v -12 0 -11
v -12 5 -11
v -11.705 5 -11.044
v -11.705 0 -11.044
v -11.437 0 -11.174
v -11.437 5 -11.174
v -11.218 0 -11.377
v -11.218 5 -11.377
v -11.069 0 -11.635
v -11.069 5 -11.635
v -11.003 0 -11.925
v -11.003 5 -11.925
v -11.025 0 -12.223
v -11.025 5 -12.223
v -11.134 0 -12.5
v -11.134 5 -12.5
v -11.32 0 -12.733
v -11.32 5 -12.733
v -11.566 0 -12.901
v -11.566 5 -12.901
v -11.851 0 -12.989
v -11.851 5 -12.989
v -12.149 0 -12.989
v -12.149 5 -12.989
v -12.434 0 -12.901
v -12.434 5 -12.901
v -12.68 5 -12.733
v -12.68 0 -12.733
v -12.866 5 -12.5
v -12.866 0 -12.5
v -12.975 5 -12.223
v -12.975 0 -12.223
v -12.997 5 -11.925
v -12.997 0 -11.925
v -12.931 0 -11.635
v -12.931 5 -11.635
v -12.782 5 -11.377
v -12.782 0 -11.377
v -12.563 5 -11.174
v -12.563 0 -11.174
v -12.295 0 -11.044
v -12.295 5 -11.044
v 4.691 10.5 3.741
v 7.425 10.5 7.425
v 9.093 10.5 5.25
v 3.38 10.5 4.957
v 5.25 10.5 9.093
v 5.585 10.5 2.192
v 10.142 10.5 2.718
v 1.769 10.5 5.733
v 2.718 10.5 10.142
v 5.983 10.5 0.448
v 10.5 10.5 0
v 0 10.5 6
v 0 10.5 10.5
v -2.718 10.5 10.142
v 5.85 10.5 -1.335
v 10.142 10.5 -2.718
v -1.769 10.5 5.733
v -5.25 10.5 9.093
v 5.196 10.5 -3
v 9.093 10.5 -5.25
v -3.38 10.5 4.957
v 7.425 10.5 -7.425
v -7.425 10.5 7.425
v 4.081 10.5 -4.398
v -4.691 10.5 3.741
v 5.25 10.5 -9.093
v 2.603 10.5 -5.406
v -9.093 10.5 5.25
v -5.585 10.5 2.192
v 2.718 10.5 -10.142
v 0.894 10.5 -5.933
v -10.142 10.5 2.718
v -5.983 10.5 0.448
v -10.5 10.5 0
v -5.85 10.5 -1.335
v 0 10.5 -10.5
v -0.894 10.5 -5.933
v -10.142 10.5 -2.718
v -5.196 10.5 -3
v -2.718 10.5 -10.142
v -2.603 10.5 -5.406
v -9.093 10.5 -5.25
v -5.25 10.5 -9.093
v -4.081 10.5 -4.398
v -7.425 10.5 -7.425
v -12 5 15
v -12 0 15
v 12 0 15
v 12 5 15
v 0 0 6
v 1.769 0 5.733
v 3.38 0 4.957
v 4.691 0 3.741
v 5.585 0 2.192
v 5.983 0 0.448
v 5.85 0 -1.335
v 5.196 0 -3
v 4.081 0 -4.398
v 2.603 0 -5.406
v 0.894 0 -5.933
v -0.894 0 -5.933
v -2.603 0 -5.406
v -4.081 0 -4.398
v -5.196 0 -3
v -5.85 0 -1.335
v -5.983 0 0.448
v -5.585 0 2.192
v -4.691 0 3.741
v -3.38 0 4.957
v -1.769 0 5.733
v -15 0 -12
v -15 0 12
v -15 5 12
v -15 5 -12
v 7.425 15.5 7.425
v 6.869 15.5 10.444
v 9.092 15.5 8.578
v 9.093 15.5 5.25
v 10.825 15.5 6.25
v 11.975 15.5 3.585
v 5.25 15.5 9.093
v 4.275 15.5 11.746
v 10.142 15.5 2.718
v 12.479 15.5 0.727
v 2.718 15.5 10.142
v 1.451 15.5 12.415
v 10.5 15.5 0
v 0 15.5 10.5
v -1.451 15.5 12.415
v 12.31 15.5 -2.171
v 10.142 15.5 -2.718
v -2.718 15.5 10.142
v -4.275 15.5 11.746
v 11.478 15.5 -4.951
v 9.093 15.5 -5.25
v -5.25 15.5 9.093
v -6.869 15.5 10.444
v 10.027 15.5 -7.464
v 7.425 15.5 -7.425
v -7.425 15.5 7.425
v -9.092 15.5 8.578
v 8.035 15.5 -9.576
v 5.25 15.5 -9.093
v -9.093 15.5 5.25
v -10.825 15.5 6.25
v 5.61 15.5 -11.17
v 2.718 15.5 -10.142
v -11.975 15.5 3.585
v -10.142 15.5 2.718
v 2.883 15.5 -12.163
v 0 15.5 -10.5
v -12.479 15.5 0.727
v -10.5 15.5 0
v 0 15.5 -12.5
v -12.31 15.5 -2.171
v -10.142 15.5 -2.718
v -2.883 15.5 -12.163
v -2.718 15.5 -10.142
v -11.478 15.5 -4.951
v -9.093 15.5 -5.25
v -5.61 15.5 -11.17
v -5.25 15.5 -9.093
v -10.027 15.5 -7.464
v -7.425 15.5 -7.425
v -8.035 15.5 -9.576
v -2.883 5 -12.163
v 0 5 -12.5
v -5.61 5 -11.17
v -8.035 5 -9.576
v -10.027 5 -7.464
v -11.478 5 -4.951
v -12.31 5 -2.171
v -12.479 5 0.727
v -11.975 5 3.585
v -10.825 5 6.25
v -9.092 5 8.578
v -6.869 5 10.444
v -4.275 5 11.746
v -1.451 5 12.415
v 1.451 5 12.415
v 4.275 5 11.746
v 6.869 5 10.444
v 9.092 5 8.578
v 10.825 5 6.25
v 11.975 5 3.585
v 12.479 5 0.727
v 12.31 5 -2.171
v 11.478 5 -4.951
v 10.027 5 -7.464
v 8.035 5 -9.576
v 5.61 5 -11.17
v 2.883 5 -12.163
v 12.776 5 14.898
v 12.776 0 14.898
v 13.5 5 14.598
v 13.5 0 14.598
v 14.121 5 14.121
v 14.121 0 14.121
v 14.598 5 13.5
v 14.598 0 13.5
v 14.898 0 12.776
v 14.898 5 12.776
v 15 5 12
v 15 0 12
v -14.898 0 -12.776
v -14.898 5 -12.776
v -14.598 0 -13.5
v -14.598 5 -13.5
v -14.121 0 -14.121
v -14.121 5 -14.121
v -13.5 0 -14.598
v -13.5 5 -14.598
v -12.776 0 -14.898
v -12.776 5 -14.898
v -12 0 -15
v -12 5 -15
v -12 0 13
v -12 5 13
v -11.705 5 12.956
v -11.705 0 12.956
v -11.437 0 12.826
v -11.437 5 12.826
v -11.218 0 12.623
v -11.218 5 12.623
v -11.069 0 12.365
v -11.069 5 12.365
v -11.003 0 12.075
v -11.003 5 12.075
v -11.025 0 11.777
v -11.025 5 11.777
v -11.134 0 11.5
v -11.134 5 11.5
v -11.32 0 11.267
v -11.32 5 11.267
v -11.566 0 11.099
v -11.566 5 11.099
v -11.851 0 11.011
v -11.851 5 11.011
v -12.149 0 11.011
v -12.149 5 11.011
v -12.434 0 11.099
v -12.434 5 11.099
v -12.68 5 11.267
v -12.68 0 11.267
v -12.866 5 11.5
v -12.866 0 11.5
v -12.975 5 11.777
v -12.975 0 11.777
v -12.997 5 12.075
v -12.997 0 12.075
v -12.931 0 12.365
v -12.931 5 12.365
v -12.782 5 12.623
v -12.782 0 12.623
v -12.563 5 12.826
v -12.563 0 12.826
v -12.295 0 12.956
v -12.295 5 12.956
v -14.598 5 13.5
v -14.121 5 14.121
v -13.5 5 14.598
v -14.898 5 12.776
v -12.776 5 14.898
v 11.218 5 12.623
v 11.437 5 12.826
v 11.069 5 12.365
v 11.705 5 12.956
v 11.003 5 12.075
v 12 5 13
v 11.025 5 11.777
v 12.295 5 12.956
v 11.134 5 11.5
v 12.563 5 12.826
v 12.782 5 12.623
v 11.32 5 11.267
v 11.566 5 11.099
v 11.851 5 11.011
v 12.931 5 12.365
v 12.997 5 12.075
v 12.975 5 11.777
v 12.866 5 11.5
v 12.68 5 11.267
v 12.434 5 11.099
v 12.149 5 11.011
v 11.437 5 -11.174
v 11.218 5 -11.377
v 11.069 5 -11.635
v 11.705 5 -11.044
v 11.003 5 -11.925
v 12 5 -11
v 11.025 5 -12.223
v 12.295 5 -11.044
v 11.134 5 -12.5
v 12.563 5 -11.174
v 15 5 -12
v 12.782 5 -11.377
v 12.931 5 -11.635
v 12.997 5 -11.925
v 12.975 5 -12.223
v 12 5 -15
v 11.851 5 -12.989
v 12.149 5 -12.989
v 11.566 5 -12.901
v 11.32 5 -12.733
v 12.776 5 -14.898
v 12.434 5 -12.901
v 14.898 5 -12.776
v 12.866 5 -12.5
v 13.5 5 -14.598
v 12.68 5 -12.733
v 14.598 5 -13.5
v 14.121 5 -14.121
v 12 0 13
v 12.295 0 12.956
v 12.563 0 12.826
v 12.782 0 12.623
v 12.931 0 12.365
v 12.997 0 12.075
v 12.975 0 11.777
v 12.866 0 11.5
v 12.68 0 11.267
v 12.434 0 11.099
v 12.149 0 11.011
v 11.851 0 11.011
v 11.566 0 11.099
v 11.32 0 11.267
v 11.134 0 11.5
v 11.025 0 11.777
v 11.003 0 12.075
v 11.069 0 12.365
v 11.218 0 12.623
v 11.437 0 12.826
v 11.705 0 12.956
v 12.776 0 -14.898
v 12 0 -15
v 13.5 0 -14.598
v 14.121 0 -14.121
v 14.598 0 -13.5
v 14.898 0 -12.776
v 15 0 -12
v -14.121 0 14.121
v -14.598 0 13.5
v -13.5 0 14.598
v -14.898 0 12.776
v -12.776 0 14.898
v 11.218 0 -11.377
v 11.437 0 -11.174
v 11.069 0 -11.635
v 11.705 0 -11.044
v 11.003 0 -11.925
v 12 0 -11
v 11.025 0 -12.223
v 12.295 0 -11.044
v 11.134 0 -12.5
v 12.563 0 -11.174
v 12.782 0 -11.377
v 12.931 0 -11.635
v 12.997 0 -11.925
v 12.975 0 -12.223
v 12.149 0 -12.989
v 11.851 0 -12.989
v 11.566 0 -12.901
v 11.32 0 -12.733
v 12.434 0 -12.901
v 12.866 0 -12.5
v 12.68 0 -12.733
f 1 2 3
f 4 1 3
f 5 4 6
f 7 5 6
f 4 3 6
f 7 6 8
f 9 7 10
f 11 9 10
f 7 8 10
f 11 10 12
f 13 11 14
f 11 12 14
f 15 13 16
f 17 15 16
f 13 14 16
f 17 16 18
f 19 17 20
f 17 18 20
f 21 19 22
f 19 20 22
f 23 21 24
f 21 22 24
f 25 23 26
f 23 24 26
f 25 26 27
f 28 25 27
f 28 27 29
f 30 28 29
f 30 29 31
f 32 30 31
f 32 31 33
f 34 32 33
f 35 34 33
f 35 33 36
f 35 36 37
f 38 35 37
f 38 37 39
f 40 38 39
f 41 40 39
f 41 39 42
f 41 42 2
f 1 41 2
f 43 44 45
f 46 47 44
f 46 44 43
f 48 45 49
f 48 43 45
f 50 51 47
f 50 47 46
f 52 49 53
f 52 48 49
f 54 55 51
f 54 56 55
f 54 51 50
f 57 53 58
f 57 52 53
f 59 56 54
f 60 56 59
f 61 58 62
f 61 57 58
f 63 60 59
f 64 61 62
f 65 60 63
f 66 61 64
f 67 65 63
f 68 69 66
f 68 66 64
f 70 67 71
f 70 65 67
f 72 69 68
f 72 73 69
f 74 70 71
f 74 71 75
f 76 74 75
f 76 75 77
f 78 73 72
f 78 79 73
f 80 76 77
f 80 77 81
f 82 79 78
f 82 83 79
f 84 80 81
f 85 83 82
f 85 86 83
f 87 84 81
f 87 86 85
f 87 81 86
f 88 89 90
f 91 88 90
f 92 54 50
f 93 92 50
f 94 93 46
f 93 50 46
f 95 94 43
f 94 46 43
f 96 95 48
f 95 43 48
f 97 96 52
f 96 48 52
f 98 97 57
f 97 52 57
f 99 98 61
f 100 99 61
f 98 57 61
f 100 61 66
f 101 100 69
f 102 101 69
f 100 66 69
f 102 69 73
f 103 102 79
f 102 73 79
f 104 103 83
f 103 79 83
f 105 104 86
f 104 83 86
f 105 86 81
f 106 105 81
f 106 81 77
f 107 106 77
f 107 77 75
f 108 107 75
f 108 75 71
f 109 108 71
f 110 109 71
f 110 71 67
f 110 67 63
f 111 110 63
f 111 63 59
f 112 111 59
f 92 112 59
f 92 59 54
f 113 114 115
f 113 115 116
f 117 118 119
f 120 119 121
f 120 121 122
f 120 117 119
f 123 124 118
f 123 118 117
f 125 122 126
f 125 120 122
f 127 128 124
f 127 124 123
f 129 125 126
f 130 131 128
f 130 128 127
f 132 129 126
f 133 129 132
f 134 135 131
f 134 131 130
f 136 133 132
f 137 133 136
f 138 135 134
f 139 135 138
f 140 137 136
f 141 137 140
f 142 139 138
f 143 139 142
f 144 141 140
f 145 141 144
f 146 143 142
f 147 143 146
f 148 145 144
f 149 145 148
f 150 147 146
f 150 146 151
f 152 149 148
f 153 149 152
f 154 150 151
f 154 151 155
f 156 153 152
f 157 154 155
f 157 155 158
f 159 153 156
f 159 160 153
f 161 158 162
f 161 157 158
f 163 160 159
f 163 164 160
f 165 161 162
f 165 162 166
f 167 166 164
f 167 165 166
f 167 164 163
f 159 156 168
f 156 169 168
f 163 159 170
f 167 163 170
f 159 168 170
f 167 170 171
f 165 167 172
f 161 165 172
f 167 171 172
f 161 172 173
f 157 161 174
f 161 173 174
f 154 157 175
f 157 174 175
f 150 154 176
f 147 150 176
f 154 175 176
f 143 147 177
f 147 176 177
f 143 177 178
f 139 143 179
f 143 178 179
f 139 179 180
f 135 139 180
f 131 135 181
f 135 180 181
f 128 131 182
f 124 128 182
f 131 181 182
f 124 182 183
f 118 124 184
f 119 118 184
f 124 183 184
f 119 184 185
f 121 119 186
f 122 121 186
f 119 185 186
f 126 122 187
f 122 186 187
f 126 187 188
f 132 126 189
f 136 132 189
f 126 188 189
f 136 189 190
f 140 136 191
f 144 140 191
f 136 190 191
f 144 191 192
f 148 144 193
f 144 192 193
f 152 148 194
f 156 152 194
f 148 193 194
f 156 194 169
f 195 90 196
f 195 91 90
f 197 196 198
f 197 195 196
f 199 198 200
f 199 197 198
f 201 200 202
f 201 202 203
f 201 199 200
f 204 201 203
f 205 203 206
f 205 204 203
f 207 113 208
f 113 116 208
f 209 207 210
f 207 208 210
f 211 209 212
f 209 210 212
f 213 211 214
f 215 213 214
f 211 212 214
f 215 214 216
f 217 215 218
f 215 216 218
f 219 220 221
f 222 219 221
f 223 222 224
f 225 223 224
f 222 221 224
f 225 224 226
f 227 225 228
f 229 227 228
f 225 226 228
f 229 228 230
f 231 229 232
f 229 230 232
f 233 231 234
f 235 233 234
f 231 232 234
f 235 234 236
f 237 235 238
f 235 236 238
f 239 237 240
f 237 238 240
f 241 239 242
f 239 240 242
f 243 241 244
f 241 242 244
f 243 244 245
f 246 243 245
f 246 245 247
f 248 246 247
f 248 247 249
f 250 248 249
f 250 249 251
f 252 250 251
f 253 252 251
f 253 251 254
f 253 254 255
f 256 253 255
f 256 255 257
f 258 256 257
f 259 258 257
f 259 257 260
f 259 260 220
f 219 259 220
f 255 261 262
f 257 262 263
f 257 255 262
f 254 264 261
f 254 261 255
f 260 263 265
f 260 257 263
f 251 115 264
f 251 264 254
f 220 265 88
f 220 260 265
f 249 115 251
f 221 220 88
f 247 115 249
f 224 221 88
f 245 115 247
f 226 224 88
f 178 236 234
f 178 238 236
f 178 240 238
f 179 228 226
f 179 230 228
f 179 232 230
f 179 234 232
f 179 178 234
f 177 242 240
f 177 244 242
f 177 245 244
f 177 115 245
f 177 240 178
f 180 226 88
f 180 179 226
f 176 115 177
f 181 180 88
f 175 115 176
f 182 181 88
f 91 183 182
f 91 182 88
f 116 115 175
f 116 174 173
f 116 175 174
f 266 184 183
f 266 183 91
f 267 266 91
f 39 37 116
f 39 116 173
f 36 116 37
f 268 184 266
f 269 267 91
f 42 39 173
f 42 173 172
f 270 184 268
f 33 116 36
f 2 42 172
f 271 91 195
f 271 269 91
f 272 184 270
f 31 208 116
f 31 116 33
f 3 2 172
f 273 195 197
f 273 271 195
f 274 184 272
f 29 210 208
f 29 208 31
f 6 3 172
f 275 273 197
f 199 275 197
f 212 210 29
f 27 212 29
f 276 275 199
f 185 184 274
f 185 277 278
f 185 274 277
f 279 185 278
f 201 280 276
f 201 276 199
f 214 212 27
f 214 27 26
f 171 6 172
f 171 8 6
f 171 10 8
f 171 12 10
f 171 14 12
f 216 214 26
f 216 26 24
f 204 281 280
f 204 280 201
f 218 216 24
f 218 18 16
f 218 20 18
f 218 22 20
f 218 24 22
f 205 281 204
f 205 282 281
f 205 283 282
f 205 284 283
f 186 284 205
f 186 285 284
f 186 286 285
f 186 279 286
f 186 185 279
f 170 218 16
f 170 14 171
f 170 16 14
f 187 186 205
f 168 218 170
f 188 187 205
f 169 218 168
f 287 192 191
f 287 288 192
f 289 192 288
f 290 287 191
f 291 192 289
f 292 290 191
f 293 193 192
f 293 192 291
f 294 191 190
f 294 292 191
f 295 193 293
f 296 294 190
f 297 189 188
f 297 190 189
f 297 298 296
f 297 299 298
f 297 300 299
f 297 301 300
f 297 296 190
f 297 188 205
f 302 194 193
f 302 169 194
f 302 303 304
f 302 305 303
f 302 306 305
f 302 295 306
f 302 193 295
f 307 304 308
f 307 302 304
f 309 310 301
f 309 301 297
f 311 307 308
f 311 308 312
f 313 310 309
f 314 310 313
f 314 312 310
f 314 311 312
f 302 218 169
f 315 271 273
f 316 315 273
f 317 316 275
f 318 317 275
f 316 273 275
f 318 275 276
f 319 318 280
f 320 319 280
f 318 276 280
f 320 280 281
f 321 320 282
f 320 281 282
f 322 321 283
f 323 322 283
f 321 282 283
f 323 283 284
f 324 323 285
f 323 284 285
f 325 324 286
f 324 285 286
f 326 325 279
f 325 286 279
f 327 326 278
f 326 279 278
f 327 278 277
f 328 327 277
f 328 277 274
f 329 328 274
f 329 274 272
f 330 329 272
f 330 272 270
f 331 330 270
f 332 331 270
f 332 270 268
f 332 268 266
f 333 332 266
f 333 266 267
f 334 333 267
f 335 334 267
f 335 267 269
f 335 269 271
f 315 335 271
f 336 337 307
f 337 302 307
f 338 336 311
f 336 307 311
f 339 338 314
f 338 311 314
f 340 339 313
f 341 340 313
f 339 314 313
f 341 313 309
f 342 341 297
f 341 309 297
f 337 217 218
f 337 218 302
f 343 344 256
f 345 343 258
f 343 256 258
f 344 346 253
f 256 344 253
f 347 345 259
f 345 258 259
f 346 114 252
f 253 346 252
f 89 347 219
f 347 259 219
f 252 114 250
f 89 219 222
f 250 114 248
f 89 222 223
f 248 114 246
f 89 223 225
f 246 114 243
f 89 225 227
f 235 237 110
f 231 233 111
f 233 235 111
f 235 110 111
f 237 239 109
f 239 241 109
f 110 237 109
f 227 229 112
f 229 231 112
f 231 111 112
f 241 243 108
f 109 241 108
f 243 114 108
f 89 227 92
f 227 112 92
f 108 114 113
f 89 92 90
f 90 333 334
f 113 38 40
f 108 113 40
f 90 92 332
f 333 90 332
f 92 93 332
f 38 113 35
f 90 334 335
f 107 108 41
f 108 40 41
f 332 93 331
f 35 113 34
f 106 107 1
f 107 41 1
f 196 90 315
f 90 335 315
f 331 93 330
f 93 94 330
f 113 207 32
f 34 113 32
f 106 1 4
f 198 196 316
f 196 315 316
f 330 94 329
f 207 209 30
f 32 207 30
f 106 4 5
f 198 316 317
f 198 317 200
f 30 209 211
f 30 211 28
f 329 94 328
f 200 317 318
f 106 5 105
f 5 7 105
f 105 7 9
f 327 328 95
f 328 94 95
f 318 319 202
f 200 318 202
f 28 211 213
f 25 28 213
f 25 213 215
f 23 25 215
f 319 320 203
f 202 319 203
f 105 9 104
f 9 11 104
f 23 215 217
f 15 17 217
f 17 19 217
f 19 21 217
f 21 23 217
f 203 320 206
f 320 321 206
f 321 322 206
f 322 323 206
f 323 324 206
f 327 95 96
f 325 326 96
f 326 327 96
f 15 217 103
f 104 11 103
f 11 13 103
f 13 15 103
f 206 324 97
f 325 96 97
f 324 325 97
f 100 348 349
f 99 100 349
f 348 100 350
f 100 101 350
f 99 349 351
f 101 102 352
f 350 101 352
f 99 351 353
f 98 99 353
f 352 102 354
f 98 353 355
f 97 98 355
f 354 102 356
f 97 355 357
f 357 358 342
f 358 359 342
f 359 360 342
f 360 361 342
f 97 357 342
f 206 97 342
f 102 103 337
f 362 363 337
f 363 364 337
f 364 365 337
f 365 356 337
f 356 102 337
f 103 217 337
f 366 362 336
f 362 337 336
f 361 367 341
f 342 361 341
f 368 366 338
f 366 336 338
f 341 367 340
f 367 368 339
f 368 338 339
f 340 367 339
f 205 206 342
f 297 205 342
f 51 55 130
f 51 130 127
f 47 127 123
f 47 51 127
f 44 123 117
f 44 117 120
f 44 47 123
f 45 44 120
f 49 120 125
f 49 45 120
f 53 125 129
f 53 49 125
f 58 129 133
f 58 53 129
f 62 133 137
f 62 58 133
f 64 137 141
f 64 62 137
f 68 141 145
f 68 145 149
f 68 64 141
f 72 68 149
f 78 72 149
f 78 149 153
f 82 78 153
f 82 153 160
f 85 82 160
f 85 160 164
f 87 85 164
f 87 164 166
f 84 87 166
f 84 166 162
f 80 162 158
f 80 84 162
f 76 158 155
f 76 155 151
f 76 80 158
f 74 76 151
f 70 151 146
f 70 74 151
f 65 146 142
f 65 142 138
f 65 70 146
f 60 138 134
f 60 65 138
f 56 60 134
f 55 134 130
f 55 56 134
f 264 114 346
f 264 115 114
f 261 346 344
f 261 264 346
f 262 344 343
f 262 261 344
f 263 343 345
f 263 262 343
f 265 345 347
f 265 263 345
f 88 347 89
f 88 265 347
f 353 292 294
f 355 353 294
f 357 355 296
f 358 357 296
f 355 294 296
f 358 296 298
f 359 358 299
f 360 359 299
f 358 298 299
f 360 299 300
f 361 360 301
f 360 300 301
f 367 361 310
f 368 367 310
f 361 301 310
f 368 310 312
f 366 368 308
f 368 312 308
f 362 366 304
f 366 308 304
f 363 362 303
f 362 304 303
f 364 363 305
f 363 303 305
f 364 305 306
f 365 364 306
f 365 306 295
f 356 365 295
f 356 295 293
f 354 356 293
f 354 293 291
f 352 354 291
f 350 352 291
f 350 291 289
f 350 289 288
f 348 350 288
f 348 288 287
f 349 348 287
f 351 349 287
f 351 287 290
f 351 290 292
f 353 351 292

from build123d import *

# Parameters (mm, degrees)
SKETCH1_W           = 30
SKETCH1_H           = 30
BOSS_EXTRUDE1_DEPTH = 5
CUT_EXTRUDE1_REACH  = 23.794
SKETCH2_R           = 1
FILLET1_R           = 3
SKETCH3_R           = 12.5
BOSS_EXTRUDE2_DEPTH = 5.5
SKETCH4_R           = 12.5
SKETCH4_R_2         = 10.5
BOSS_EXTRUDE3_DEPTH = 5
CUT_EXTRUDE2_REACH  = 25.67
SKETCH5_R           = 6


with BuildPart() as part:
    # Sketch1 → Boss-Extrude1 (new body)
    with BuildSketch(Plane(origin=(0, 0, 0), x_dir=(1, 0, 0), z_dir=(0, 1, 0))):
        Rectangle(SKETCH1_W, SKETCH1_H)
    extrude(amount=BOSS_EXTRUDE1_DEPTH)

    # Sketch2 → Cut-Extrude1 (cut, up to next)
    with BuildSketch(Plane(origin=(0, 5, 0), x_dir=(1, 0, 0), z_dir=(0, 1, 0)), mode=Mode.PRIVATE) as cut_extrude1_sk1:
        with Locations(Location((-12, 12, 0), (0, 0, 270))):
            Circle(SKETCH2_R)
    cut_extrude1_tool1 = extrude(cut_extrude1_sk1.sketch, amount=-CUT_EXTRUDE1_REACH, mode=Mode.PRIVATE) & part.part
    # Sketch2 → Cut-Extrude1 (cut, up to next)
    with BuildSketch(Plane(origin=(0, 5, 0), x_dir=(1, 0, 0), z_dir=(0, 1, 0)), mode=Mode.PRIVATE) as cut_extrude1_sk2:
        with Locations(Location((12, 12, 0), (0, 0, 270))):
            Circle(SKETCH2_R)
    cut_extrude1_tool2 = extrude(cut_extrude1_sk2.sketch, amount=-CUT_EXTRUDE1_REACH, mode=Mode.PRIVATE) & part.part
    # Sketch2 → Cut-Extrude1 (cut, up to next)
    with BuildSketch(Plane(origin=(0, 5, 0), x_dir=(1, 0, 0), z_dir=(0, 1, 0)), mode=Mode.PRIVATE) as cut_extrude1_sk3:
        with Locations(Location((-12, -12, 0), (0, 0, 270))):
            Circle(SKETCH2_R)
    cut_extrude1_tool3 = extrude(cut_extrude1_sk3.sketch, amount=-CUT_EXTRUDE1_REACH, mode=Mode.PRIVATE) & part.part
    # Sketch2 → Cut-Extrude1 (cut, up to next)
    with BuildSketch(Plane(origin=(0, 5, 0), x_dir=(1, 0, 0), z_dir=(0, 1, 0)), mode=Mode.PRIVATE) as cut_extrude1_sk4:
        with Locations(Location((12, -12, 0), (0, 0, 270))):
            Circle(SKETCH2_R)
    cut_extrude1_tool4 = extrude(cut_extrude1_sk4.sketch, amount=-CUT_EXTRUDE1_REACH, mode=Mode.PRIVATE) & part.part
    add(cut_extrude1_tool1.solids().sort_by_distance((-12, 5, -12))[0], mode=Mode.SUBTRACT)
    add(cut_extrude1_tool2.solids().sort_by_distance((12, 5, -12))[0], mode=Mode.SUBTRACT)
    add(cut_extrude1_tool3.solids().sort_by_distance((-12, 5, 12))[0], mode=Mode.SUBTRACT)
    add(cut_extrude1_tool4.solids().sort_by_distance((12, 5, 12))[0], mode=Mode.SUBTRACT)

    # Fillet1
    fillet1_edges = [part.edges().sort_by_distance(p)[0] for p in [
        (15, 2.5, 15),
        (-15, 2.5, 15),
        (-15, 2.5, -15),
        (15, 2.5, -15),
    ]]
    fillet(fillet1_edges, radius=FILLET1_R)

    # Sketch3 → Boss-Extrude2 (add)
    with BuildSketch(Plane(origin=(0, 5, 0), x_dir=(1, 0, 0), z_dir=(0, 1, 0))):
        with Locations(Location((0, 0, 0), (0, 0, 90))):
            Circle(SKETCH3_R)
    extrude(amount=BOSS_EXTRUDE2_DEPTH)

    # Sketch4 → Boss-Extrude3 (add)
    with BuildSketch(Plane(origin=(0, 10.5, 0), x_dir=(1, 0, 0), z_dir=(0, 1, 0))):
        with Locations(Location((0, 0, 0), (0, 0, 90))):
            Circle(SKETCH4_R)
        with Locations(Location((0, 0, 0), (0, 0, 270))):
            Circle(SKETCH4_R_2, mode=Mode.SUBTRACT)
    extrude(amount=BOSS_EXTRUDE3_DEPTH)

    # Sketch5 → Cut-Extrude2 (cut, up to next)
    with BuildSketch(Plane(origin=(0, 10.5, 0), x_dir=(1, 0, 0), z_dir=(0, 1, 0)), mode=Mode.PRIVATE) as cut_extrude2_sk1:
        with Locations(Location((0, 0, 0), (0, 0, 270))):
            Circle(SKETCH5_R)
    cut_extrude2_tool1 = extrude(cut_extrude2_sk1.sketch, amount=-CUT_EXTRUDE2_REACH, mode=Mode.PRIVATE) & part.part
    add(cut_extrude2_tool1.solids().sort_by_distance((0, 10.5, 0))[0], mode=Mode.SUBTRACT)


solid = part.part
